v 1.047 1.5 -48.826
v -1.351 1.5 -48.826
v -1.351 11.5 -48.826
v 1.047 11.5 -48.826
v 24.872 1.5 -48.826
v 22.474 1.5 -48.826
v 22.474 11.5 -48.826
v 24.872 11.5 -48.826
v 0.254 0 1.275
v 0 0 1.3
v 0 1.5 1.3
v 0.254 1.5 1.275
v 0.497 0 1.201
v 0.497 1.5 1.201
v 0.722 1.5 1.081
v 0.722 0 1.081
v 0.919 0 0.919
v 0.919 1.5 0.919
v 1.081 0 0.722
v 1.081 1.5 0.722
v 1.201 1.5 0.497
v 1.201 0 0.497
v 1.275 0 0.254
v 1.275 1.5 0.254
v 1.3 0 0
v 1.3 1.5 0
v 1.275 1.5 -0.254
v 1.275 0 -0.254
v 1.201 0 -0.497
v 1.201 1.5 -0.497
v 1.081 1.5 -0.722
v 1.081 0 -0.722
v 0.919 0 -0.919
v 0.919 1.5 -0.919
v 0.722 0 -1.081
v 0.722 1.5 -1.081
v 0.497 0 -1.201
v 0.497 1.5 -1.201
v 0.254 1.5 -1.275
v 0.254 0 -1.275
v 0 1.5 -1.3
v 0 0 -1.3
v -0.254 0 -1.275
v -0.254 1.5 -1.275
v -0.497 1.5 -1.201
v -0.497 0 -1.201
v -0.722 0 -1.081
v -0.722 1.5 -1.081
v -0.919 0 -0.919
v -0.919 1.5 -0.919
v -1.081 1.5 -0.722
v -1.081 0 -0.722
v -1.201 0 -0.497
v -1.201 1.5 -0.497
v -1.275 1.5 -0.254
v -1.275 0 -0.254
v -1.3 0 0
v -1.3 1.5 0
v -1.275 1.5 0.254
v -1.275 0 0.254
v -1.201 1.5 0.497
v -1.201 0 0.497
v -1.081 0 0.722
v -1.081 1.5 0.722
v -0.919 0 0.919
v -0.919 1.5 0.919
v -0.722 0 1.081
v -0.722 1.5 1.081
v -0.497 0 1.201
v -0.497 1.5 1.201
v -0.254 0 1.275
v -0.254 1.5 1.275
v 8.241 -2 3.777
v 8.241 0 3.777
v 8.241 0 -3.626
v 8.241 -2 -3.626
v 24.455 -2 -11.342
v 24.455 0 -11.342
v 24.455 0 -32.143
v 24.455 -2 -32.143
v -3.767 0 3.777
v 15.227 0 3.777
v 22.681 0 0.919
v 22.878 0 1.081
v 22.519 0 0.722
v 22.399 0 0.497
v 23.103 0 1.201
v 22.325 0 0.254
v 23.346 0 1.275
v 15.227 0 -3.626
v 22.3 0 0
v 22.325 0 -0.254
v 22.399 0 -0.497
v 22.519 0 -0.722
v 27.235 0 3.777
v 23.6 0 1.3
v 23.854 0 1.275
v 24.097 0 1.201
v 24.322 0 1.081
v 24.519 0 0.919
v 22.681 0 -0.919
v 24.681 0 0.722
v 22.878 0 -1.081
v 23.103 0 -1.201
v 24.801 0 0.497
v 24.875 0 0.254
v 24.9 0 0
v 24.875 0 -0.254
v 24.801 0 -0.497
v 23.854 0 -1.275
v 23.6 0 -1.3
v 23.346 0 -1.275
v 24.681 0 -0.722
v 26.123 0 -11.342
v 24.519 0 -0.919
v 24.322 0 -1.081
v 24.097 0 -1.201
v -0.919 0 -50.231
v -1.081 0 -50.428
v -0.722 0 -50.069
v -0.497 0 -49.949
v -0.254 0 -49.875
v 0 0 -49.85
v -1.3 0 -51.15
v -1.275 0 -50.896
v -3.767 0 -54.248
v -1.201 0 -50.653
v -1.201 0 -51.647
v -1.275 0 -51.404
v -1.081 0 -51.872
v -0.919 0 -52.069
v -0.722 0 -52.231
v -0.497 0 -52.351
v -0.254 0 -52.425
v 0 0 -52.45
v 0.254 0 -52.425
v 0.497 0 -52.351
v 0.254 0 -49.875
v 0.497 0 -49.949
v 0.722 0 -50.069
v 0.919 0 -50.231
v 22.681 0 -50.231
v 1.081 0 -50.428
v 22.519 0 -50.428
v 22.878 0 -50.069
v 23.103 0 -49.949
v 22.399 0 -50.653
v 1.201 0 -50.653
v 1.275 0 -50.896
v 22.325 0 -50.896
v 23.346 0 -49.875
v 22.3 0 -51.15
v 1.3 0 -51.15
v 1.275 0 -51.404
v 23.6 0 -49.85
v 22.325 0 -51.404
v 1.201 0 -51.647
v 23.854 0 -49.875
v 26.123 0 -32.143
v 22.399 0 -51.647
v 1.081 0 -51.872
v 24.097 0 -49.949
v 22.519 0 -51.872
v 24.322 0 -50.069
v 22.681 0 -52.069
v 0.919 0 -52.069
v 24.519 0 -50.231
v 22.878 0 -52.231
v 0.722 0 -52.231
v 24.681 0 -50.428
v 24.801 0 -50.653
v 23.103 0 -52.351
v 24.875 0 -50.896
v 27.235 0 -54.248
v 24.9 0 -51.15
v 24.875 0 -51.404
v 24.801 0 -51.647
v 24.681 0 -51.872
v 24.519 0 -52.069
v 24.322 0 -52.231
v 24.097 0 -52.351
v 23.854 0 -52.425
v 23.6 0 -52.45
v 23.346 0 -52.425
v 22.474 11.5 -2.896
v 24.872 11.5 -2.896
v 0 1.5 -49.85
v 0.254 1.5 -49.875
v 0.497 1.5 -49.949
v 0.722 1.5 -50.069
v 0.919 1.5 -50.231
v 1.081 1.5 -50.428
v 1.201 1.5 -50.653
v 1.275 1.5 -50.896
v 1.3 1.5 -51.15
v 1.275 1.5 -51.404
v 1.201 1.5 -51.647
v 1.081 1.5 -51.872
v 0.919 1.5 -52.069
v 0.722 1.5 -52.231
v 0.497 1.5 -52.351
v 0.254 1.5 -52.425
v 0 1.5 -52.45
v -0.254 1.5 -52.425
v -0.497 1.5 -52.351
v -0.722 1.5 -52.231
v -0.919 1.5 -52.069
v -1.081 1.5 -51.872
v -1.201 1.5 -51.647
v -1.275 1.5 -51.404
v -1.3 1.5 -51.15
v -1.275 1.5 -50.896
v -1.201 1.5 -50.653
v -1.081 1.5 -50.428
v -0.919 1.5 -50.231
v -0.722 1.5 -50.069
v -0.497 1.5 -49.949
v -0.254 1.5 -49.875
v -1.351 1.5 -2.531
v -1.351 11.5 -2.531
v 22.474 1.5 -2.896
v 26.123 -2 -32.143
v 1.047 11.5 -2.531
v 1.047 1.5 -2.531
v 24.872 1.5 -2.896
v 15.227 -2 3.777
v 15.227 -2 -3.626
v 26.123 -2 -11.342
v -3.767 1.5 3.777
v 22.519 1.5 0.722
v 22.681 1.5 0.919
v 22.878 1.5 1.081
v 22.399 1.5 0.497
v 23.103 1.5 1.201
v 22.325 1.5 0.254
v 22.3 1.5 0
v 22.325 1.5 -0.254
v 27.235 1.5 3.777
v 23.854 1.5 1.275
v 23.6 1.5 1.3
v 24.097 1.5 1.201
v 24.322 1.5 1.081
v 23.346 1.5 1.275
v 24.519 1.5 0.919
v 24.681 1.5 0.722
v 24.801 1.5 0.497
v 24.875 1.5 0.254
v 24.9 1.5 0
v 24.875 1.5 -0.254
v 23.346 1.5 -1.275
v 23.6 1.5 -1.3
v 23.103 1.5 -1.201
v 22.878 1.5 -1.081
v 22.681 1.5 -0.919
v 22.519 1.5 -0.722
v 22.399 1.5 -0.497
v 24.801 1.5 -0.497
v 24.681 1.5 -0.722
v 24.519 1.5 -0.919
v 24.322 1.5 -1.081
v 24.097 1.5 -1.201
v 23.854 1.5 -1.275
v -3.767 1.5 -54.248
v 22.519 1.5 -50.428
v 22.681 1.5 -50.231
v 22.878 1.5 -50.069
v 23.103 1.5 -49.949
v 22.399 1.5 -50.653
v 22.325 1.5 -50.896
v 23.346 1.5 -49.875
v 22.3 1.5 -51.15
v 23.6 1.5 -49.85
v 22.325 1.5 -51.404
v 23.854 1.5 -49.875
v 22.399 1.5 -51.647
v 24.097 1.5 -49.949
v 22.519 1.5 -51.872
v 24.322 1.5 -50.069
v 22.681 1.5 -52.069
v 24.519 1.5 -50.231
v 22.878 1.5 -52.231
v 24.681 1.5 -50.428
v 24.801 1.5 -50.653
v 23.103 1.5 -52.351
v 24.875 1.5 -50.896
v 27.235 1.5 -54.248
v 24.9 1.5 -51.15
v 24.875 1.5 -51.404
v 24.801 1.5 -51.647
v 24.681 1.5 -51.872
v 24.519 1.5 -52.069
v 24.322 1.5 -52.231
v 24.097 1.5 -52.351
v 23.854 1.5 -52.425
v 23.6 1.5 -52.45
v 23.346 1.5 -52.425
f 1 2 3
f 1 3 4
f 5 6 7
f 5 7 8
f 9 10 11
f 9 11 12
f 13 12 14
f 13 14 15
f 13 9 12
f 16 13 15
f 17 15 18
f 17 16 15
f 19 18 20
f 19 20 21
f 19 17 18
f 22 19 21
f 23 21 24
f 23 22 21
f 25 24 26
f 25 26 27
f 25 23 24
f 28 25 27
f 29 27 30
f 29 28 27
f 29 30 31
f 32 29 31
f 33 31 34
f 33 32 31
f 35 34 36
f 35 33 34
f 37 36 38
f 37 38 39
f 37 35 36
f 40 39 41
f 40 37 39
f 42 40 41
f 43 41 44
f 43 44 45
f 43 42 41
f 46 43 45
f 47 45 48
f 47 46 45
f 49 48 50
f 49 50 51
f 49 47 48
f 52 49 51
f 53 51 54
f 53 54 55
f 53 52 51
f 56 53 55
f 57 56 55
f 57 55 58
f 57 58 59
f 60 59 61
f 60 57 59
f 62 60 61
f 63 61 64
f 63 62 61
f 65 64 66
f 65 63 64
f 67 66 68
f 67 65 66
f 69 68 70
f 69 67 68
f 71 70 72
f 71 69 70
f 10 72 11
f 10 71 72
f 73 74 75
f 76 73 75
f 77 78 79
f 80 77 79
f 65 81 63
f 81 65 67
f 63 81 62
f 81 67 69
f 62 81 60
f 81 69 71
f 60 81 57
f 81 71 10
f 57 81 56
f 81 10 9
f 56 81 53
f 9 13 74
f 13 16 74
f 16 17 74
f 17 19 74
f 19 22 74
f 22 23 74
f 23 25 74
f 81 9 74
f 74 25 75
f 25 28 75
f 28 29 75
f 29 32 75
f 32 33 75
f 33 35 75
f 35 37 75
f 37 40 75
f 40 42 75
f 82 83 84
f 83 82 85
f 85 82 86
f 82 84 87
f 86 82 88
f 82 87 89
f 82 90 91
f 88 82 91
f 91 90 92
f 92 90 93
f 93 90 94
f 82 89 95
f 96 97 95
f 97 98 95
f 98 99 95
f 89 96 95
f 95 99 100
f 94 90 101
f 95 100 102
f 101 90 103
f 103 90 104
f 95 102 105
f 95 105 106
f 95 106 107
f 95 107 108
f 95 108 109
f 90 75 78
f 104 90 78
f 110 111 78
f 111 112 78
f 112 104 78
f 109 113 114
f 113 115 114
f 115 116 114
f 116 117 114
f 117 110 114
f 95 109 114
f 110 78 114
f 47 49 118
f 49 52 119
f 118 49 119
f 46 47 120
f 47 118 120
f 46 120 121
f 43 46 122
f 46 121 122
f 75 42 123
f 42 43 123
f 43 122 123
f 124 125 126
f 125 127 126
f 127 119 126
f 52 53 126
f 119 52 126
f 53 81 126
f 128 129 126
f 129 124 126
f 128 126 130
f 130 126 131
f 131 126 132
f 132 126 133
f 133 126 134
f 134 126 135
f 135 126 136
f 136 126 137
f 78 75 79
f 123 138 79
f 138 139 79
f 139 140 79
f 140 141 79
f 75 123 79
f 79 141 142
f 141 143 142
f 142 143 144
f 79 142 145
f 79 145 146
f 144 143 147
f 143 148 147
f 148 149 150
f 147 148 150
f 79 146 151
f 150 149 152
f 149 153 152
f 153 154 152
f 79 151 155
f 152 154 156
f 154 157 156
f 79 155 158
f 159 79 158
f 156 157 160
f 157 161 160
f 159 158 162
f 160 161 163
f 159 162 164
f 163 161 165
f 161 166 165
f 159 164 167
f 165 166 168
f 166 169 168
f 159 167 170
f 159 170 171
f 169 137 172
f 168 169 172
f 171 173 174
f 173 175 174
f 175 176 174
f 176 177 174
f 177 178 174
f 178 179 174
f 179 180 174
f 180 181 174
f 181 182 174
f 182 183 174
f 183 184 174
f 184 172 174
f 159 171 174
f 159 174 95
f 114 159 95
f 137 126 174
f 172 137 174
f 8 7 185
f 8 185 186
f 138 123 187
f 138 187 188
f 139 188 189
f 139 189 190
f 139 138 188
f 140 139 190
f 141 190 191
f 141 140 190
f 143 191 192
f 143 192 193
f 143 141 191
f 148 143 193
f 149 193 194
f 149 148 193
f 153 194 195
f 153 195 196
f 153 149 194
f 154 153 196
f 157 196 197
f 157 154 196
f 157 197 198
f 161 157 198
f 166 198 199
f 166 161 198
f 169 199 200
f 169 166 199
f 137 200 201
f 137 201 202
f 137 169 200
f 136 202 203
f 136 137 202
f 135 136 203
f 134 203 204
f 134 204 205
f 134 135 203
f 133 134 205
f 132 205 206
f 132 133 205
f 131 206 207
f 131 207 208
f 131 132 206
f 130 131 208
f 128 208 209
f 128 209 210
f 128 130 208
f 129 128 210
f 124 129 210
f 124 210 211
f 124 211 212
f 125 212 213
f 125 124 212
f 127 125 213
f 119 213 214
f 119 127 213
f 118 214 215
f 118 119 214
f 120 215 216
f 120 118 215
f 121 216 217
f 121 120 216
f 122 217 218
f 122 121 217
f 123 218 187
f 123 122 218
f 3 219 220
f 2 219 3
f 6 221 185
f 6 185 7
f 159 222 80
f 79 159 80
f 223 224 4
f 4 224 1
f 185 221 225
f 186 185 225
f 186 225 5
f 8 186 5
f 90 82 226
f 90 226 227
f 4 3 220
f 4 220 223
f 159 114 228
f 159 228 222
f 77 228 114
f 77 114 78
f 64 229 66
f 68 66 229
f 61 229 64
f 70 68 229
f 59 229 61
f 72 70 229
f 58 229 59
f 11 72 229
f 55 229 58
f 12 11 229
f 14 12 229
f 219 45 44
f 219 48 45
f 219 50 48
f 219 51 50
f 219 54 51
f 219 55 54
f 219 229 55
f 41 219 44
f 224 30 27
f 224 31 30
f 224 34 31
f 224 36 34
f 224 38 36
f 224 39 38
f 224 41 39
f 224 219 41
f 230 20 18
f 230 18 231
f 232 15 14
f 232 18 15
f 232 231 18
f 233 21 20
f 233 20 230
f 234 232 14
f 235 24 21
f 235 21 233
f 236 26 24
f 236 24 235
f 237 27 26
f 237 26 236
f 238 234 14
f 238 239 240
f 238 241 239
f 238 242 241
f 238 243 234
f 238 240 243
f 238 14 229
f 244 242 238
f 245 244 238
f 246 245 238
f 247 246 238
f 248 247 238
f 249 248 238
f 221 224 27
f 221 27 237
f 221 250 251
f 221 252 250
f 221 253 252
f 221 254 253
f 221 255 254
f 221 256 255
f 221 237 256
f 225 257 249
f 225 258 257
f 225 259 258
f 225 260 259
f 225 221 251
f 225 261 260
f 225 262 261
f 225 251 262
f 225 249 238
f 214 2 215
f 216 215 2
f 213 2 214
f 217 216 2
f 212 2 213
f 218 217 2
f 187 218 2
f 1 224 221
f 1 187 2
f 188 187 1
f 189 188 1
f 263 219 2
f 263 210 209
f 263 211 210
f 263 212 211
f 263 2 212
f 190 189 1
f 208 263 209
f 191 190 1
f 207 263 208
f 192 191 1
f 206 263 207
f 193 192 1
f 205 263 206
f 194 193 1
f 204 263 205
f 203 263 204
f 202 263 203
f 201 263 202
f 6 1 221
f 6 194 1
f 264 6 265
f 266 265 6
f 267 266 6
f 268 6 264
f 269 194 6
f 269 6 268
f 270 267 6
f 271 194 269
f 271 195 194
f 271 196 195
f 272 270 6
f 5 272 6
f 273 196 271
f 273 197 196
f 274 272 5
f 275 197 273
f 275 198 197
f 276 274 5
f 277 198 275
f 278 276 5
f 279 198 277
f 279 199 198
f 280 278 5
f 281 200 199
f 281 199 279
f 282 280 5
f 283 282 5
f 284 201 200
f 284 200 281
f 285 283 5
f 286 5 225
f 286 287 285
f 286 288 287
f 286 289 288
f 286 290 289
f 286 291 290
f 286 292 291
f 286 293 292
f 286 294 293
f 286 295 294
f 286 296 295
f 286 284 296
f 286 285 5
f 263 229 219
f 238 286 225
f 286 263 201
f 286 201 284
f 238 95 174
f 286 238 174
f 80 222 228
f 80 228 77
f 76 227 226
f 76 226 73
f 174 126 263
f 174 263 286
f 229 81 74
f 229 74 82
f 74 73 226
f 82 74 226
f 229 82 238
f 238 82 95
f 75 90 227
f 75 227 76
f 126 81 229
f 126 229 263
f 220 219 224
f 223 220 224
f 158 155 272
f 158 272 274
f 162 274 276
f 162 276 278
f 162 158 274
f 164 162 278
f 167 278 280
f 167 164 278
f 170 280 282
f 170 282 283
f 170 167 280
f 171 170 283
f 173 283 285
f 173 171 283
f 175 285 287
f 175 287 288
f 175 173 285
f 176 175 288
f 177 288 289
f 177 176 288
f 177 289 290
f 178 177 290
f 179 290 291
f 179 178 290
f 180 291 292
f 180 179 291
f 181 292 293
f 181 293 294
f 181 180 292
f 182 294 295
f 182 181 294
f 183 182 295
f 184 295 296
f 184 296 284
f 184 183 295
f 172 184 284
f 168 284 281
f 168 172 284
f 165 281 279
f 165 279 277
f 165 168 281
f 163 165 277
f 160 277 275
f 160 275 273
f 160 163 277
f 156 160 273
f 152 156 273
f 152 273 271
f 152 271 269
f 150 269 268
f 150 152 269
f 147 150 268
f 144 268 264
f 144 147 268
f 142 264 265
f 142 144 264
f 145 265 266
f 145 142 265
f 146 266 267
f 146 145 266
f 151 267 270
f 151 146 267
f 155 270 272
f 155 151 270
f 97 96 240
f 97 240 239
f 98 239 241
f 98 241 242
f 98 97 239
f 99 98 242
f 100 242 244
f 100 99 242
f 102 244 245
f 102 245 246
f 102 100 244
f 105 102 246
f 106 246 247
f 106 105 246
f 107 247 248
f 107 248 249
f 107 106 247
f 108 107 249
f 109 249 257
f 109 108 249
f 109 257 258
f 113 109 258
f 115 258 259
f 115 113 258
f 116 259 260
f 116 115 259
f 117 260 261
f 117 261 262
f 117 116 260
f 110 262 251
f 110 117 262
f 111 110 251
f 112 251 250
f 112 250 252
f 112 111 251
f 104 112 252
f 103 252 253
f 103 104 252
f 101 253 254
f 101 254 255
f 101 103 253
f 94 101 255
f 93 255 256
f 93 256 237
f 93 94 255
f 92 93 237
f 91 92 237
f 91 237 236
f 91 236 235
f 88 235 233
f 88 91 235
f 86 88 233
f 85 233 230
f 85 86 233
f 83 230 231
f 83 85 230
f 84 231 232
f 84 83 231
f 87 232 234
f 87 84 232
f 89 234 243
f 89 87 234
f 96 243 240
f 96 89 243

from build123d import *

# Parameters (mm, degrees)
SKETCH1_W           = 31.001294418
SKETCH1_H           = 58.025746404
SKETCH1_R           = 1.3
BOSS_EXTRUDE1_DEPTH = 1.5
SKETCH2_W           = 6.985889014
SKETCH2_H           = 7.403537408
BOSS_EXTRUDE2_DEPTH = 2
SKETCH3_W           = 2.398141005
SKETCH3_H           = 46.294548095
SKETCH3_H_2         = 45.929613594
BOSS_EXTRUDE3_DEPTH = 10
SKETCH4_W           = 1.668272003
SKETCH4_H           = 20.801266543
BOSS_EXTRUDE4_DEPTH = 2


with BuildPart() as part:
    # Sketch1 → Boss-Extrude1 (new body)
    with BuildSketch(Plane(origin=(0, 0, 0), x_dir=(1, 0, 0), z_dir=(0, 1, 0))):
        with Locations((11.734043017, 25.235374996)):
            Rectangle(SKETCH1_W, SKETCH1_H)
        with Locations(Location((0, 0, 0), (0, 0, 270))):
            Circle(SKETCH1_R, mode=Mode.SUBTRACT)
        with Locations(Location((23.6, 0, 0), (0, 0, 270))):
            Circle(SKETCH1_R, mode=Mode.SUBTRACT)
        with Locations(Location((23.6, 51.15, 0), (0, 0, 270))):
            Circle(SKETCH1_R, mode=Mode.SUBTRACT)
        with Locations(Location((0, 51.15, 0), (0, 0, 270))):
            Circle(SKETCH1_R, mode=Mode.SUBTRACT)
    extrude(amount=BOSS_EXTRUDE1_DEPTH)

    # Sketch2 → Boss-Extrude2 (add)
    with BuildSketch(Plane(origin=(0, 0, 0), x_dir=(-1, 0, 0), z_dir=(0, -1, 0))):
        with Locations((-11.734043017, -0.075729502)):
            Rectangle(SKETCH2_W, SKETCH2_H)
    extrude(amount=BOSS_EXTRUDE2_DEPTH)

    # Sketch3 → Boss-Extrude3 (add)
    with BuildSketch(Plane(origin=(0, 1.5, 0), x_dir=(1, 0, 0), z_dir=(0, 1, 0))):
        with Locations((-0.152395008, 25.678509747)):
            Rectangle(SKETCH3_W, SKETCH3_H)
        with Locations((23.672614542, 25.860976997)):
            Rectangle(SKETCH3_W, SKETCH3_H_2)
    extrude(amount=BOSS_EXTRUDE3_DEPTH)

    # Sketch4 → Boss-Extrude4 (add)
    with BuildSketch(Plane(origin=(0, 0, 0), x_dir=(-1, 0, 0), z_dir=(0, -1, 0))):
        with Locations((-25.288753045, 21.742430489)):
            Rectangle(SKETCH4_W, SKETCH4_H)
    extrude(amount=BOSS_EXTRUDE4_DEPTH)


solid = part.part
